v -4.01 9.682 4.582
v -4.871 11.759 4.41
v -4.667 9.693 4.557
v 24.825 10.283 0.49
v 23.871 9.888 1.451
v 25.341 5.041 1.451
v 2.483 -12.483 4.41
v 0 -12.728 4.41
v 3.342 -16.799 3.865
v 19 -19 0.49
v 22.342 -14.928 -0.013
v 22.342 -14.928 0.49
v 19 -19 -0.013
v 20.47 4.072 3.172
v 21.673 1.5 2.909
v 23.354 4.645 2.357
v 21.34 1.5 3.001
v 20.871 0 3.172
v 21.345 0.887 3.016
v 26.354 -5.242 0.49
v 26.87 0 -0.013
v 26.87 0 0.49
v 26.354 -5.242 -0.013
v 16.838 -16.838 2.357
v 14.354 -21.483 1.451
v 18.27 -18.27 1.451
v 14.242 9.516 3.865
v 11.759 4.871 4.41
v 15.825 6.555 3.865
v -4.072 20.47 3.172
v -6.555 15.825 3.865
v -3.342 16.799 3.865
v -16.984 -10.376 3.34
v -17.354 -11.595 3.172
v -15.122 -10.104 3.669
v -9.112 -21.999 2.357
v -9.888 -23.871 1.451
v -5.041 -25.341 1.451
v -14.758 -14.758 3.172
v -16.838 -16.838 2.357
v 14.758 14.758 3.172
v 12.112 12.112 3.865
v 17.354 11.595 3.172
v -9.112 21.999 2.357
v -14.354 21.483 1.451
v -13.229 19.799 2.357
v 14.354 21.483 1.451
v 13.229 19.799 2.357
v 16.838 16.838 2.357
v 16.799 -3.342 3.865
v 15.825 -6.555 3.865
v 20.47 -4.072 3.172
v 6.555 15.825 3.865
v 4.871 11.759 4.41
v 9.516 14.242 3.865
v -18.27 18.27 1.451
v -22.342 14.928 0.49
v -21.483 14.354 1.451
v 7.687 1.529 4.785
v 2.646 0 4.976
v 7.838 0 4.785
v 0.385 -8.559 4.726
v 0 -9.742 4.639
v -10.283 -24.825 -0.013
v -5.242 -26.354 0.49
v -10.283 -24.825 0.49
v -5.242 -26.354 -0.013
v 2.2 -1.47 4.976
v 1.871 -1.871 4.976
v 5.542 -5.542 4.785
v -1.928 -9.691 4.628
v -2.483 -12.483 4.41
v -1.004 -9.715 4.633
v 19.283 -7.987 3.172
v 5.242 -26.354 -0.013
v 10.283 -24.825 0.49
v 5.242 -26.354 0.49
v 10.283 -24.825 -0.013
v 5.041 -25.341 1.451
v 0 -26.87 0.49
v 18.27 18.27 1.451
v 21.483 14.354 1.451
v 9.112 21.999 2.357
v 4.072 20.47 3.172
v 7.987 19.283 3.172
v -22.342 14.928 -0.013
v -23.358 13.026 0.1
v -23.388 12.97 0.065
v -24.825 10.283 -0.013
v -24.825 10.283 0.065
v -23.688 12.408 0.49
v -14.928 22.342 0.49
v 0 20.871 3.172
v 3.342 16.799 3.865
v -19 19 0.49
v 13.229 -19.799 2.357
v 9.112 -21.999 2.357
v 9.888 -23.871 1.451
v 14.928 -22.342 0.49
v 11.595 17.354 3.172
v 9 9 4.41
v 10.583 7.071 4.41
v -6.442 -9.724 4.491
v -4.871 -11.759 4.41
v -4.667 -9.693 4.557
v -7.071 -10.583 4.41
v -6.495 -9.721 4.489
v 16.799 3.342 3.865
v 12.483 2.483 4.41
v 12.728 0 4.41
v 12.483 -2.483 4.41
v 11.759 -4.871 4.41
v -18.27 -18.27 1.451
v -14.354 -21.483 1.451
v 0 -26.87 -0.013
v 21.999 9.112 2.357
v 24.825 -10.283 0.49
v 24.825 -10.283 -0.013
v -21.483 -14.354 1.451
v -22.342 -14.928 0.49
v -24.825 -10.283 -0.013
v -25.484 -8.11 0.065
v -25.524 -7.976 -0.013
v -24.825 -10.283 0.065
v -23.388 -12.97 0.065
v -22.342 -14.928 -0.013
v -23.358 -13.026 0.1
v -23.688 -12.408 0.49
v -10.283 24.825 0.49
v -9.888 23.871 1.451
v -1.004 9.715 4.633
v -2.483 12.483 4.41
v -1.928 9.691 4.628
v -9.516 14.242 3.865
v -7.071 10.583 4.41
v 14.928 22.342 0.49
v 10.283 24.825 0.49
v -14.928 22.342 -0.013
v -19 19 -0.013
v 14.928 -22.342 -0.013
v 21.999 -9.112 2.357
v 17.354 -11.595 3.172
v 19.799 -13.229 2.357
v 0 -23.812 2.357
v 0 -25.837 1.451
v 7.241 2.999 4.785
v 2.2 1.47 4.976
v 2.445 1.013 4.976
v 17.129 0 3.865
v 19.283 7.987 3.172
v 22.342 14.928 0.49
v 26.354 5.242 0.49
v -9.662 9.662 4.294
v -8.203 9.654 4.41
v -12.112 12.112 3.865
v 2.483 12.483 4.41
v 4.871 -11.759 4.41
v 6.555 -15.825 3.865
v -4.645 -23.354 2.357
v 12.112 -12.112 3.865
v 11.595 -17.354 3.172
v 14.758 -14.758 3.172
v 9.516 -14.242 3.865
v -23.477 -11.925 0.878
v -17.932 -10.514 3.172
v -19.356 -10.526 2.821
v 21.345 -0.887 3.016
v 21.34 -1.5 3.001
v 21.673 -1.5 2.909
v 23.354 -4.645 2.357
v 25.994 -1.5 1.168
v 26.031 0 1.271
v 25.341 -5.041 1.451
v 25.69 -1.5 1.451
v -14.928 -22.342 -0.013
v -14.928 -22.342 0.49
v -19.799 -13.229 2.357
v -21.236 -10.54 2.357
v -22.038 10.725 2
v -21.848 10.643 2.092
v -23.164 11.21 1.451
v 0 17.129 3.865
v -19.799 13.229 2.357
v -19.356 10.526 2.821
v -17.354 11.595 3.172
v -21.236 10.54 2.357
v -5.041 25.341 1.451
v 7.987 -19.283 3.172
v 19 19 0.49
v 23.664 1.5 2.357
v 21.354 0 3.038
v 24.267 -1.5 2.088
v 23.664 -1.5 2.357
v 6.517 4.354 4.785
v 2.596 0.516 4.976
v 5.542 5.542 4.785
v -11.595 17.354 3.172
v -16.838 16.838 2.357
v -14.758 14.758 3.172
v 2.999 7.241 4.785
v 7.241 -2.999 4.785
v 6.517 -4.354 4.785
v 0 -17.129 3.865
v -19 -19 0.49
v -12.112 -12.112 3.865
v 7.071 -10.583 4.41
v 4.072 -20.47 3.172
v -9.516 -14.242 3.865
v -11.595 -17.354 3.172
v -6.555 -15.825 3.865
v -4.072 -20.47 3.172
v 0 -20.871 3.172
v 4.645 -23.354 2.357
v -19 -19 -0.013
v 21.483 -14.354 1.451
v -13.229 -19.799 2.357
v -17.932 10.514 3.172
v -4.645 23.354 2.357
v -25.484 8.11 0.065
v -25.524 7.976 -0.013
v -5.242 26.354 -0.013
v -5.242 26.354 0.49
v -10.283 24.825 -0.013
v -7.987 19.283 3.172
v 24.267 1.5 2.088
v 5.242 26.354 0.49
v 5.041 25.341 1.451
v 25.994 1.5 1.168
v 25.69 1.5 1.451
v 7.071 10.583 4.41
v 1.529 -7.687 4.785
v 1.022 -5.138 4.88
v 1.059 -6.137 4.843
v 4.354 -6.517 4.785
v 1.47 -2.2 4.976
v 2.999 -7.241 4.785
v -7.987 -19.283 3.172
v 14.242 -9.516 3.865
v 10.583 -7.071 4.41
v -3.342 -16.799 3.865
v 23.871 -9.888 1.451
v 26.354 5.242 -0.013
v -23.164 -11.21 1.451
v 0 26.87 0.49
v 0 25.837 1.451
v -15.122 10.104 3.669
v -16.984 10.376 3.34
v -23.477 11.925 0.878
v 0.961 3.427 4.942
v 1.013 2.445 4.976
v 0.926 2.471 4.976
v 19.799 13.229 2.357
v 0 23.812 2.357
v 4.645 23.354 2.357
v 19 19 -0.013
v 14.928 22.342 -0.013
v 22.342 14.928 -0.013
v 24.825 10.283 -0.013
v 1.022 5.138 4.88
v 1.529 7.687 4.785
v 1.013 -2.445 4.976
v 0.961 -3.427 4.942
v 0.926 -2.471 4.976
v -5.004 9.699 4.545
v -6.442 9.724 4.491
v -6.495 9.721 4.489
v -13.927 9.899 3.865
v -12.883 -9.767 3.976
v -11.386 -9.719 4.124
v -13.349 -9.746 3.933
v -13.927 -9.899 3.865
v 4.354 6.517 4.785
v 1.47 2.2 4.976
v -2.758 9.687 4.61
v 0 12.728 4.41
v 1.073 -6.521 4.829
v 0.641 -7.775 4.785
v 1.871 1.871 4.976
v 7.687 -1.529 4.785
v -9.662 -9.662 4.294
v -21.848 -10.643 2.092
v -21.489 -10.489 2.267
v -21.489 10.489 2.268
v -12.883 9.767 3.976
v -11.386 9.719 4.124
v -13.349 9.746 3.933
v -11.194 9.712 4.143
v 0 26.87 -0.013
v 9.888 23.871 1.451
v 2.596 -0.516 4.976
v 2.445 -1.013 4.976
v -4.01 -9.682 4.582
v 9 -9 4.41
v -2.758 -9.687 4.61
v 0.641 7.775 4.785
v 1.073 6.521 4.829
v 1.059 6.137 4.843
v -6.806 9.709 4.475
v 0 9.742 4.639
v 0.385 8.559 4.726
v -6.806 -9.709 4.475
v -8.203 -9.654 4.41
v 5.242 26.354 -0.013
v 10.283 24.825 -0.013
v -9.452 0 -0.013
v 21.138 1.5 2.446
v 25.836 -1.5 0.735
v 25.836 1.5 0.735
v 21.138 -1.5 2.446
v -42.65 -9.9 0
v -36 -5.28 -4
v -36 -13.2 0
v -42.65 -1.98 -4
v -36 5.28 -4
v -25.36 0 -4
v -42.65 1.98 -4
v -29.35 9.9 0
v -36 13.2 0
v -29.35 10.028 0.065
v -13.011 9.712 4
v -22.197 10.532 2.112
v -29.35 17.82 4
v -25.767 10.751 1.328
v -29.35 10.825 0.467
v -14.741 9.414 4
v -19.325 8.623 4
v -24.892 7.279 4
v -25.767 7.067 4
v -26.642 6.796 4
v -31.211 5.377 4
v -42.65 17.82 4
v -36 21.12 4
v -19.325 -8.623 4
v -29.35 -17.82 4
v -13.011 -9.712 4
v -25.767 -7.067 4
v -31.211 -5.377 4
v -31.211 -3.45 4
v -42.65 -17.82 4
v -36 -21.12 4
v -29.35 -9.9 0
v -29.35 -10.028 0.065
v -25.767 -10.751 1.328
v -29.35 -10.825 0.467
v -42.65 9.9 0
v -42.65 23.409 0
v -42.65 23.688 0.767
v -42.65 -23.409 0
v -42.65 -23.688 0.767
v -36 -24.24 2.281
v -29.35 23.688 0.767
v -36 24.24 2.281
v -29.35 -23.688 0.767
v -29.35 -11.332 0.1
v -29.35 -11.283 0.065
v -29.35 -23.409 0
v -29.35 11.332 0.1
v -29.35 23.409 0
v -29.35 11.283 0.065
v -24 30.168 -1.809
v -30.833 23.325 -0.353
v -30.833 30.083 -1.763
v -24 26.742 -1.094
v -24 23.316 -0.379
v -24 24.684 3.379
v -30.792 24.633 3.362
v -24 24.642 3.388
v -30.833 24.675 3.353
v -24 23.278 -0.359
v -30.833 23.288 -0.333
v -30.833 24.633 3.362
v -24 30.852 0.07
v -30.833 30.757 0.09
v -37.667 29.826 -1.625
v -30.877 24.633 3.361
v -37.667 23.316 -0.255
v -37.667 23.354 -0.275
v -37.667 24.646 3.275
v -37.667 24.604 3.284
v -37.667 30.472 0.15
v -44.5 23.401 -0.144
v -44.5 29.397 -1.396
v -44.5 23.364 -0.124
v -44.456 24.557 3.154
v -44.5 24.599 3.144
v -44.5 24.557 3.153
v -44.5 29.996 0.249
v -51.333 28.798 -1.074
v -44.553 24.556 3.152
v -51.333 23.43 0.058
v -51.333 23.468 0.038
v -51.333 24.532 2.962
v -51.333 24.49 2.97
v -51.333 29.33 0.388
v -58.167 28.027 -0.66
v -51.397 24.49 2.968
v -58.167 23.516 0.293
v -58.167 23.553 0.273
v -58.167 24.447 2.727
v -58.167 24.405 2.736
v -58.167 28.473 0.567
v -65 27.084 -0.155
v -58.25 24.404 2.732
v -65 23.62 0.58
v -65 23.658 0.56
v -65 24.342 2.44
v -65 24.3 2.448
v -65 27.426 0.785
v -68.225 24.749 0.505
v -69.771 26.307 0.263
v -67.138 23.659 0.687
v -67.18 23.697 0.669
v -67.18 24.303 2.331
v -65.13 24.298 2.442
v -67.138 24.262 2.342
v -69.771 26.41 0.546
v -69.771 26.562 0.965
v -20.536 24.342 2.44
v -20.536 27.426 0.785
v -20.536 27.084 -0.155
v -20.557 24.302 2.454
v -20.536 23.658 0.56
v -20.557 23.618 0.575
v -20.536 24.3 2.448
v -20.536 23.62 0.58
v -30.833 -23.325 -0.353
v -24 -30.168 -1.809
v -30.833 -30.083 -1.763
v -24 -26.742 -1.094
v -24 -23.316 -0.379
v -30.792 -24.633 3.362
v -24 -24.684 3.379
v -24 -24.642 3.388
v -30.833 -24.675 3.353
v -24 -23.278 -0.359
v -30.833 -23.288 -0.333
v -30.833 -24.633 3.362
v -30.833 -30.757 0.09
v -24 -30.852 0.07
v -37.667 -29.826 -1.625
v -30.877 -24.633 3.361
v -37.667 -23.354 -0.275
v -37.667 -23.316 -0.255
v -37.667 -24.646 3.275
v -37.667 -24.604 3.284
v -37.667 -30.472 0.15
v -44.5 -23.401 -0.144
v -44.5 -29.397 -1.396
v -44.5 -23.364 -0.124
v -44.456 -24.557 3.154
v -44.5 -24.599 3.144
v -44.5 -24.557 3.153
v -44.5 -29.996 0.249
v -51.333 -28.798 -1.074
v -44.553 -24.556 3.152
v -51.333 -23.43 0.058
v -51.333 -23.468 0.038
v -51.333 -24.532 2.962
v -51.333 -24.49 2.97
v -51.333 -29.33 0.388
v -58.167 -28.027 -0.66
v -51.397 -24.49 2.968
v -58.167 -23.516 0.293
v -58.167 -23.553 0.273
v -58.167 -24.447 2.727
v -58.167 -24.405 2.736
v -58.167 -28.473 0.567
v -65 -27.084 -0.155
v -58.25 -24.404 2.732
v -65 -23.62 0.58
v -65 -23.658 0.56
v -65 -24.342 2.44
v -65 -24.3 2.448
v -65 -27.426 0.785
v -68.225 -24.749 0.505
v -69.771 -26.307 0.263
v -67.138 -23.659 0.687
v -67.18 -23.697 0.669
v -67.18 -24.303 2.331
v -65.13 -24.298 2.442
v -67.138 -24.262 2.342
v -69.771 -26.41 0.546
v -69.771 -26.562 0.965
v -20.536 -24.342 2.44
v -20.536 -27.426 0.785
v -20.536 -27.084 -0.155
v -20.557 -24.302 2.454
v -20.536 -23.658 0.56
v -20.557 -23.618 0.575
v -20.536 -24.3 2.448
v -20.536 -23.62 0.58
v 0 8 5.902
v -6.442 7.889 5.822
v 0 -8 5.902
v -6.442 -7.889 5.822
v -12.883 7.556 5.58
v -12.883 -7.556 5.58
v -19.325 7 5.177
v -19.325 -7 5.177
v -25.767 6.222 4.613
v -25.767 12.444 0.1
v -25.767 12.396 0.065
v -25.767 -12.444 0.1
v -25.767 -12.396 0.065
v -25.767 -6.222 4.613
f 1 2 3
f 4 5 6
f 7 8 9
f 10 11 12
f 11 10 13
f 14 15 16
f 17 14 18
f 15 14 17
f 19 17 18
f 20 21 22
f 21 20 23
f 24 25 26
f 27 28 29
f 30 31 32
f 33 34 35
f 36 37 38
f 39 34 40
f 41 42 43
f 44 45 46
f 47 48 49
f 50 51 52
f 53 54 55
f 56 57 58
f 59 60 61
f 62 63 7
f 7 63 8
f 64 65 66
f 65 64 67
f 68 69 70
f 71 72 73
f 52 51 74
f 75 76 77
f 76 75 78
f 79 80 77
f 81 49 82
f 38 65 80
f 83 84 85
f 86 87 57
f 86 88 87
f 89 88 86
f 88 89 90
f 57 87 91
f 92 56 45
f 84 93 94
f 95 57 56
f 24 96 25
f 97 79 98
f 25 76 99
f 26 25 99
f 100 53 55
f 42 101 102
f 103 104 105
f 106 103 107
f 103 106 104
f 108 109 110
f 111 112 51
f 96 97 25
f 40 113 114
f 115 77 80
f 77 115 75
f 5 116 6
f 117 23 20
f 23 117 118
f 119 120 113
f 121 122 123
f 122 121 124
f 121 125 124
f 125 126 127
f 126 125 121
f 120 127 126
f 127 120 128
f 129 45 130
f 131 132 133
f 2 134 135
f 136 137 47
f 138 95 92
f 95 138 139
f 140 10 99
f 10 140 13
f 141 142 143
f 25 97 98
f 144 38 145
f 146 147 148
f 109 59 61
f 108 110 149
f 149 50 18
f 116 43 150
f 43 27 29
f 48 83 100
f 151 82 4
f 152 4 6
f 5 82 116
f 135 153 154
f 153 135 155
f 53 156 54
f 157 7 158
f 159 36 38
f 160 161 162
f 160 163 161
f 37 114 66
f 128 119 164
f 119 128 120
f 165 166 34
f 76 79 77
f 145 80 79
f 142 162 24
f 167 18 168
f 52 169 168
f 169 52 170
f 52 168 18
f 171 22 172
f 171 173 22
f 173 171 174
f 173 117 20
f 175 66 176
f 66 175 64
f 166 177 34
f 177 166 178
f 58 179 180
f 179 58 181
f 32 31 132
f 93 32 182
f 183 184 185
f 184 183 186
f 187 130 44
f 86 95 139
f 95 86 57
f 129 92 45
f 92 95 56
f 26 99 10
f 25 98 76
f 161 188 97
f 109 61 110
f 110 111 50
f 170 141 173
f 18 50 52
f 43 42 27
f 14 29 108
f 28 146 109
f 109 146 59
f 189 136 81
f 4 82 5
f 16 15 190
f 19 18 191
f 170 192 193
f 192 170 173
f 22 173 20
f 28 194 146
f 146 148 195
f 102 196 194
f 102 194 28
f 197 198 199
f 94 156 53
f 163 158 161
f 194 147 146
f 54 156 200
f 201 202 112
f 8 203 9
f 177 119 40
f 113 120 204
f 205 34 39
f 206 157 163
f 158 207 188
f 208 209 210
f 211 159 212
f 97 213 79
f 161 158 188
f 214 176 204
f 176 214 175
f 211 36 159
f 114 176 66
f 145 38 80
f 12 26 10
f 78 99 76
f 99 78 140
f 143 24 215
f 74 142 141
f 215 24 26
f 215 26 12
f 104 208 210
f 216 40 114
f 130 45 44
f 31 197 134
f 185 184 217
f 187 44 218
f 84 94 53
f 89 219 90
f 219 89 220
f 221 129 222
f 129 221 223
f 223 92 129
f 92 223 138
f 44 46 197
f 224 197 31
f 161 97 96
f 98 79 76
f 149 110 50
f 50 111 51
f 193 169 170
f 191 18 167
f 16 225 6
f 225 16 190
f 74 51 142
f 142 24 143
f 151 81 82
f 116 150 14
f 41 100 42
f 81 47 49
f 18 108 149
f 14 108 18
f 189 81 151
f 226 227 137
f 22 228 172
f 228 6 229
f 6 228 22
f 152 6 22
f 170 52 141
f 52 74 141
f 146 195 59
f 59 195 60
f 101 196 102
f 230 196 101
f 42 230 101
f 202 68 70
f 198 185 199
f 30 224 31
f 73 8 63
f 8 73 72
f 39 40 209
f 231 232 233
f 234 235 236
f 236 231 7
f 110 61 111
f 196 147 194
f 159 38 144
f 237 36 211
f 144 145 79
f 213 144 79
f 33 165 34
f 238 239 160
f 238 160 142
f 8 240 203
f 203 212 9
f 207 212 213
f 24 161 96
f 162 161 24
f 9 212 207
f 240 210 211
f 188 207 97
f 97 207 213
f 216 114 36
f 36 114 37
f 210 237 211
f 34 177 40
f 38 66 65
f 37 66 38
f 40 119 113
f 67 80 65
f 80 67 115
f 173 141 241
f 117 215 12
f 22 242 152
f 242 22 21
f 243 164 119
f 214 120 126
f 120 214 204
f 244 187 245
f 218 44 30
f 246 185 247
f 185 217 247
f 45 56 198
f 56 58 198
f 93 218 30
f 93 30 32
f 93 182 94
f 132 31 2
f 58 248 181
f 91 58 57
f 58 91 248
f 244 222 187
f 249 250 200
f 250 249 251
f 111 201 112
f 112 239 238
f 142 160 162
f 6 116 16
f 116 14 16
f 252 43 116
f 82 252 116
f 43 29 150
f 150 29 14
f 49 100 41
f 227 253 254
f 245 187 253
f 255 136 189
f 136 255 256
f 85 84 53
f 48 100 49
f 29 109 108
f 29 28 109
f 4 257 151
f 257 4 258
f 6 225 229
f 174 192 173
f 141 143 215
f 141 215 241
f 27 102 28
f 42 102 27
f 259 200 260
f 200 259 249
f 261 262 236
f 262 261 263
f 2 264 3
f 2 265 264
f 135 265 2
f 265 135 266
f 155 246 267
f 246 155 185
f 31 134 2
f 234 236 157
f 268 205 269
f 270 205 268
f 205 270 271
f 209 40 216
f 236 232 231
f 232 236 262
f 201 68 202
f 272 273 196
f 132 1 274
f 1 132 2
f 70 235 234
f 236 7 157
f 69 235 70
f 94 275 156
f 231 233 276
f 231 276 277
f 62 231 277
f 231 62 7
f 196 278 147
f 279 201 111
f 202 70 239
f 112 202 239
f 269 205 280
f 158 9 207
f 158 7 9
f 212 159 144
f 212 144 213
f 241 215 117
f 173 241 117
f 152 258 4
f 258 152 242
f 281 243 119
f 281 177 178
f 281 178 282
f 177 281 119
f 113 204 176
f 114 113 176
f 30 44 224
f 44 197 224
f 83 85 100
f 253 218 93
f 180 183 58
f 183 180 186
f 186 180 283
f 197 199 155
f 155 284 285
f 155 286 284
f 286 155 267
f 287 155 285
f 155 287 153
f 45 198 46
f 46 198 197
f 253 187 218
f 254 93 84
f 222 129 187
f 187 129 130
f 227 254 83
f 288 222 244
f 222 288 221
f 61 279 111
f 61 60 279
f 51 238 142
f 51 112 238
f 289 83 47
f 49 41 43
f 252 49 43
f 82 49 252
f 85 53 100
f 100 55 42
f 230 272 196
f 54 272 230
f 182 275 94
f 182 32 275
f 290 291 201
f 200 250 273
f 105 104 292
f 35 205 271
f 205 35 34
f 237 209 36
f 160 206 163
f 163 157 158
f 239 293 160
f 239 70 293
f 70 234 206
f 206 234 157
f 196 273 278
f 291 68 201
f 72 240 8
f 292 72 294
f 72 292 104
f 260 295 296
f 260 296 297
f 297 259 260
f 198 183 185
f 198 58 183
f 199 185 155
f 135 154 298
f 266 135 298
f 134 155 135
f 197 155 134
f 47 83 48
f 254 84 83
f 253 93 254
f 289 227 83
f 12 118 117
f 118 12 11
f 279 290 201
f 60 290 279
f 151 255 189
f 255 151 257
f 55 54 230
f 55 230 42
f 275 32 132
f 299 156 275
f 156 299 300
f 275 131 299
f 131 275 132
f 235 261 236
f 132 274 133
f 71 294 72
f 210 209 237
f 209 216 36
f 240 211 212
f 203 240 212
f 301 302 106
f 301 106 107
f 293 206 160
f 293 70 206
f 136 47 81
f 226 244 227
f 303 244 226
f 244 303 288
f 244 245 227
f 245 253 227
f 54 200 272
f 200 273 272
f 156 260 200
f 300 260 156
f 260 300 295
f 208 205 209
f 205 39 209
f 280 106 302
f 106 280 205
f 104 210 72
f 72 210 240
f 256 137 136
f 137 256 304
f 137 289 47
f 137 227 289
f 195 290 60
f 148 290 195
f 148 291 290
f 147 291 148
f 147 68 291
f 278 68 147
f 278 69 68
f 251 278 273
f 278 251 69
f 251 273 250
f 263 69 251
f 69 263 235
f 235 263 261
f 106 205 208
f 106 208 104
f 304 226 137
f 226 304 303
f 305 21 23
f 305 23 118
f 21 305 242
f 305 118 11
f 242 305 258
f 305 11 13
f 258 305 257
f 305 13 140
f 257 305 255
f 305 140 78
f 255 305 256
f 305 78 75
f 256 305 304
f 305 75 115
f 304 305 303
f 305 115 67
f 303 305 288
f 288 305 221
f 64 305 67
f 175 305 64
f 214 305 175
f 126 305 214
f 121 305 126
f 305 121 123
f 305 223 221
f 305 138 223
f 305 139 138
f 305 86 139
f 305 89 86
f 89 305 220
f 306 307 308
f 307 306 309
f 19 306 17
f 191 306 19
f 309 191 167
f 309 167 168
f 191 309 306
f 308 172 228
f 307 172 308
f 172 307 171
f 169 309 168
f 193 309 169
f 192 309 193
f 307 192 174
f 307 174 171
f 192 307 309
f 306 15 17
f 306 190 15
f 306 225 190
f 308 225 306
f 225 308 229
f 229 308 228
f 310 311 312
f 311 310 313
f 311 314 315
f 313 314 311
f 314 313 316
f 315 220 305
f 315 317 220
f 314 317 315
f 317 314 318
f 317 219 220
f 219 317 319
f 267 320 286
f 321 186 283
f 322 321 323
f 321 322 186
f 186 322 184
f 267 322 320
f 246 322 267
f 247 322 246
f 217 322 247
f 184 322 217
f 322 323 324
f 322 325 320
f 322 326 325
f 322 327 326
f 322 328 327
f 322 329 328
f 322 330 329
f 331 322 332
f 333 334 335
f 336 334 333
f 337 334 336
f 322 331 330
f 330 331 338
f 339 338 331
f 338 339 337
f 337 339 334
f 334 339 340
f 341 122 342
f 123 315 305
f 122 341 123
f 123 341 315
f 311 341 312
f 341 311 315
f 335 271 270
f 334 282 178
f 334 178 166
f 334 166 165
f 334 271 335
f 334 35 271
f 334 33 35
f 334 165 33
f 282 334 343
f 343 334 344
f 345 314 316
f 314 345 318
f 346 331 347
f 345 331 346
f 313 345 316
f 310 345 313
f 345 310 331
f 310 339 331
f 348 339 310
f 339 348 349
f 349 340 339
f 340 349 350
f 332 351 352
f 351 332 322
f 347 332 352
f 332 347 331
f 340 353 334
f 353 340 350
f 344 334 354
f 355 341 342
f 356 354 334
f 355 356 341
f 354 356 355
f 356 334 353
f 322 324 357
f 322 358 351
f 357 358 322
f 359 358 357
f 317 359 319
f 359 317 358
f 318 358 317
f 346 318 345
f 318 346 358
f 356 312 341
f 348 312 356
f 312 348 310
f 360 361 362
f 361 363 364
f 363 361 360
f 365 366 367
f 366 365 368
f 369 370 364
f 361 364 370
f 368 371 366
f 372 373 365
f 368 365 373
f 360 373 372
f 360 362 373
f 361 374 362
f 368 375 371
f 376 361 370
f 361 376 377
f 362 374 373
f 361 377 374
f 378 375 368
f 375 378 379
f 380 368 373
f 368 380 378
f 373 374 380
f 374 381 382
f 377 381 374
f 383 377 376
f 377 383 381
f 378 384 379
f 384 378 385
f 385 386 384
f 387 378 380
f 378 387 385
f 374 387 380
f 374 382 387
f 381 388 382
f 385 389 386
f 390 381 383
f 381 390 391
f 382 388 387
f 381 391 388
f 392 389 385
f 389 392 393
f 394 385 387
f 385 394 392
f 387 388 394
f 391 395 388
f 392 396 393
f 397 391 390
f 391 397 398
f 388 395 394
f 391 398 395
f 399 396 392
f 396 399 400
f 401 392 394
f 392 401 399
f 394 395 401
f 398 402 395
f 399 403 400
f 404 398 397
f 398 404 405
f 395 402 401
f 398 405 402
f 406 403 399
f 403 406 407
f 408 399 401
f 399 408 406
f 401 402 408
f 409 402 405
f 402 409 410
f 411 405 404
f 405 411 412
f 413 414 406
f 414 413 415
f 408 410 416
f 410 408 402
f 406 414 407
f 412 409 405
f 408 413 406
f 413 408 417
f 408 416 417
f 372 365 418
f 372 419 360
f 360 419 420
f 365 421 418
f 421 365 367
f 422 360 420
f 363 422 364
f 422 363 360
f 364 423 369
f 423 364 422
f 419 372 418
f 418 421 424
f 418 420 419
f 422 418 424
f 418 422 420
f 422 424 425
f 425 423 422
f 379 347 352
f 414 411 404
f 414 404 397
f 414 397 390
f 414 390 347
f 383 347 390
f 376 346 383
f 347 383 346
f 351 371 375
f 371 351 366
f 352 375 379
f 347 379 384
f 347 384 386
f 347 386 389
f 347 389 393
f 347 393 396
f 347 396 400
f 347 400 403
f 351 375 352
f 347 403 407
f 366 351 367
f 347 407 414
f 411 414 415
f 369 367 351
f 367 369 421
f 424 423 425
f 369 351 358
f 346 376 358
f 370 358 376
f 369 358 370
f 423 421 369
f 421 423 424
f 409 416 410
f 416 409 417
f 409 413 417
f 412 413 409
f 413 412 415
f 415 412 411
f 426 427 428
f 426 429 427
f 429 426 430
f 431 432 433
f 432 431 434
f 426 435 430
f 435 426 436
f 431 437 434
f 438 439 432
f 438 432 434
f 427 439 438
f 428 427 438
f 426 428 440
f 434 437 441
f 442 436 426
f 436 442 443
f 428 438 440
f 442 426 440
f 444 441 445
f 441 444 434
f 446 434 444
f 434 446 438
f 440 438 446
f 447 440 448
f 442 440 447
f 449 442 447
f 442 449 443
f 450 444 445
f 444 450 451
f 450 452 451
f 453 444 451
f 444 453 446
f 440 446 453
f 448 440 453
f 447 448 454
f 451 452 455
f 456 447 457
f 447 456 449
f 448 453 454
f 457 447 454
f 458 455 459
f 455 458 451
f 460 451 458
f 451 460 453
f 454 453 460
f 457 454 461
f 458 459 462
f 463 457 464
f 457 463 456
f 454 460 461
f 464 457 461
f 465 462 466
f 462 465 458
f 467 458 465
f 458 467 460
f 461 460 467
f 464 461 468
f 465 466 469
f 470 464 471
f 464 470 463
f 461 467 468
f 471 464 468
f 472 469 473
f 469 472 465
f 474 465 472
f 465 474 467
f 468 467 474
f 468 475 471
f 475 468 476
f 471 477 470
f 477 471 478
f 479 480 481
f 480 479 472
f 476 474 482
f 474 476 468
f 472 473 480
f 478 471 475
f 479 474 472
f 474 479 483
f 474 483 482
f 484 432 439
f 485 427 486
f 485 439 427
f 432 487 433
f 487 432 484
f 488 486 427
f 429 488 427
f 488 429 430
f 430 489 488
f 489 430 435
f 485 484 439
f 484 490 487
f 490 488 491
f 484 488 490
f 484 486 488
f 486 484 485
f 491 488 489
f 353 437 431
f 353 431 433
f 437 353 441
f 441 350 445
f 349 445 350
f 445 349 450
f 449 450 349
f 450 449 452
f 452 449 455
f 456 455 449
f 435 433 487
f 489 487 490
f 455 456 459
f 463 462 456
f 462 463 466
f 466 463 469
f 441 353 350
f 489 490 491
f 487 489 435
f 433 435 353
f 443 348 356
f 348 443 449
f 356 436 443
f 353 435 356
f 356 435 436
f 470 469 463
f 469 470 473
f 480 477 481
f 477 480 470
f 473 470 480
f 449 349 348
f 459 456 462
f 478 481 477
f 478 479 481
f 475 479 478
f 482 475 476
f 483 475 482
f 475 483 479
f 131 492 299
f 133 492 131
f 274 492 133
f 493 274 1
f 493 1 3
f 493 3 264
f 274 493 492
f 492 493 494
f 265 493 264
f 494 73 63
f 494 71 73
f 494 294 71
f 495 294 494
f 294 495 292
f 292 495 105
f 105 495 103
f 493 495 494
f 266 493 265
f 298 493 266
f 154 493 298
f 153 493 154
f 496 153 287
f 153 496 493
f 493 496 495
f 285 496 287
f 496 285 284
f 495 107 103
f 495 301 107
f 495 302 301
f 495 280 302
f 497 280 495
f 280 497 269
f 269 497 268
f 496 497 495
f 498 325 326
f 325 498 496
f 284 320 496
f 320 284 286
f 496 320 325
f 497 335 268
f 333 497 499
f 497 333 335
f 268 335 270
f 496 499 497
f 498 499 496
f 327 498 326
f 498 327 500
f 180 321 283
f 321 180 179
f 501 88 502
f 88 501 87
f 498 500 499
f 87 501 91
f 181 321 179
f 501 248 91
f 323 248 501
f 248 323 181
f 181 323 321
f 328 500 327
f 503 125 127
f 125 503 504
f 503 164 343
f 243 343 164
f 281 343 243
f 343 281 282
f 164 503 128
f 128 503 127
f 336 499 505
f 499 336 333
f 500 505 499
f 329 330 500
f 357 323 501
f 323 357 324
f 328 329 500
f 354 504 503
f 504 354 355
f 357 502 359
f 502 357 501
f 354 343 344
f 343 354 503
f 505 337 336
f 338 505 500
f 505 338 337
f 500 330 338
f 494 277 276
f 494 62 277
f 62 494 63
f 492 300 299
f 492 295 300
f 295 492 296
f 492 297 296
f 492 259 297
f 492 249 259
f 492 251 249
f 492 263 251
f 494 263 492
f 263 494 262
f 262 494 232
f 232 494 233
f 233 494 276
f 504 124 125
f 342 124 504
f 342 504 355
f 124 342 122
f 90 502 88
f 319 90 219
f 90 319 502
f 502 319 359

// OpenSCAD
// file: util.scad
fn1 = 32;
fn2 = 16;

module util_half_sphere(radius, fn=fn1) {
    difference() {
        sphere(radius, $fn=fn);
        translate([0,0,-(radius+radius/19)])
            cube(2*radius+radius/10, center=true);
    }
}

function gcd(a,b) = a == b ? a : a > b ? gcd(a-b, b) : gcd(a, b-a);

module util_saucer(length, width, height, fn=fn1) {
    rad = gcd(length,gcd(width,height));
    //rad = 10;
    scale([length/(2*rad), width/(2*rad), height/rad])
        util_half_sphere(rad, fn);
}

module util_half_cylinder(length, radius, inner_fn=fn2, outer_fn=fn1) {
    maxval = max(length, 2*radius);
    intersection() {
        difference() {
            rotate([0,90,0])
                translate([0,0,-(length/2 + length/20)])
                    cylinder(length+length/10, radius, radius, $fn=inner_fn);
            
            translate([0,0,(maxval/2 + maxval/19)])
                cube(maxval+maxval/10, center=true);
        }
        
        translate([0,0,-(radius+radius/20)])
            cylinder(radius + radius/10, length/2, length/2, $fn=outer_fn);
    }
}

module util_body(length, width, height, upper_height, fn=fn1) {
    rad = gcd(length, gcd(width, upper_height));
    
    scale(.995) scale([length/(2*rad), width/(2*rad), 1])
        util_half_cylinder(2*rad, height, outer_fn=fn);
}

module util_graded_cylinder(height, radius_start, radius_end, grades=1, fn=fn1) {
    height_grade = height / grades;
    radius_grade = (radius_start - radius_end) / (grades * grades);
    for (i = [0 : 1 : grades]) {
        translate([0,0,i*height_grade])
            cylinder(height_grade, 
                     radius_start - i*radius_grade * i,
                     radius_start - (i+1) * radius_grade * (i+1),
                     $fn = fn);
    }
}

module util_nacelle(length, width, height, curved=false, up=true, front_bulge=false) {
    rad = min(width, height/2);
    grads = curved ? 6 : 1;
    scale_factor = front_bulge ? 1.1 : 1;
    direction = up ? -1 : 1;
    difference() {
        scale([1, width/ (2*rad), height/rad])
            difference() {
                union() {
                    rotate([0,-90,0])
                        rotate(30)
                            util_graded_cylinder(length-rad, rad, rad/2, grads, 6);
                    scale(scale_factor) 
                        rotate([0,90,0]) rotate(90) sphere(rad, $fn=6);
                }
                
                translate([-length/2, 0, direction * (height/2 + height/19)])
                    cube([length+length, width+width, height+height/10], center=true);
            }
        
        translate([-length-(curved?length/3:0), 0, -length/3])
            rotate([0,-45,0])
                cube(length, center=true);
    }
}

module util_mirrored(v) {
    children();
    mirror(v) children();
}

module util_ring(outer, inner, height) {
    difference() {
        translate([0,0,-height/2])
            cylinder(height, outer, outer);
        translate([0,0,-(height/2 + height/19)])
            cylinder(height+height/10, inner, inner);
    }
}

module util_star(radius, thick, num, half=false) {
    angle = 360/num;
    offset = half? angle/2 : 0;
    for (i = [0: 1: num]) {
        rotate(i* angle + offset)
            translate([radius/2,0,0])
                cube([radius, thick, thick], center=true);
    }
}

module util_ring_star(radius, thick, num, inner, half=false) {
    outer=inner+thick;
    avg = (inner + outer)/2;
    union() {
        difference() {
            util_star(radius, thick, num, half);
            cylinder(2*thick, outer, outer, $fn=num, center=true);
        }
        util_ring(outer, inner, thick);
    }
}

module util_hangar_disk(height, lower, upper, num, fn=fn1) {
    difference() {
            cylinder(height, lower, upper, $fn=fn, center=true);
        difference() {
            scale([1,1,22])
                util_star(1.1*upper, height/20, num, half=true);
            scale(.95)
                cylinder(height, lower, upper, $fn=fn, center=true);
        }
    }
}

module util_hangar_form(length, width, height, num, inner=0) {
    l = 0.6* max(length, width);
    h = 2.5* height;
    thick = min(height/20,1);
    inner = inner == 0 ? l/3 : inner;
    difference() {
        children();
        scale([1,1,h/thick]) 
            util_ring_star(l, thick, num, inner, half=true);
    }
    scale(.95) children();
}

module util_nacelle_bar(span, height, width, thickness) {
    rad = (span*span/(8*height) + height/2);
    outer = rad + thickness/2;
    inner = rad - thickness/2;
    difference(){
        translate([0,0,outer])
            rotate([0,90,0])
                util_ring(outer, inner, width);
    
        translate([0,0,1.1*outer+height])
            cube(2.2*outer, center=true);
    }
}
// main file
use <util.scad>;

module tactical_shuttle() {
    difference() {
        util_saucer(9,9,2.25);

        translate([3,0,2])
            rotate([0,-66,0])
                cube([1.5,1.5,3],center=true);
    }

    translate([-3.5,0,1])
        scale([1,1,.5])
            rotate([90,0,0])
                cylinder(5,2,2,$fn=6,center=true);

    util_mirrored([0,1,0])
        translate([-4,1.5,1])
            rotate([90,0,0])
                util_nacelle(7.5,1,4,curved=true,up=false);
};


module runabout() {
    difference() {
        util_saucer(18,18,3);

        translate([6,0,3])
            rotate([0,-75,0])
                cube([3,3,5],center=true);
    }

    translate([-7.5,0,0])
        scale([1,1,.4])
            rotate([90,0,0])
                cylinder(10,4,4,$fn=6,center=true);

    translate([-7.5,0,1])
        mirror([0,0,1])
            util_nacelle_bar(16,2.5,3,.5);

    util_mirrored([0,1,0])
        translate([-3,7.5,-2])
            scale([1,1,.5])
                union() {
                    rotate([0,90,0])
                        cylinder(14,1.5,1.5,center=true,$fn=16);

                    util_mirrored([1,0,0])
                        translate([7,0,0])
                            sphere(1.5,$fn=16);
                }
}

module yacht() {
    difference() {
        util_saucer(27,27,3.5);

        translate([10,0,3])
            rotate([0,-75,0])
                cube([3,3,5],center=true);
    }

    translate([-13,0,0]) {

        difference(){
            mirror([0,0,1])
                util_saucer(16,8,2.5);

            translate([-4,0,-2.5])
                scale([1.5,1,1])
                    rotate([90,0,0])
                        cylinder(10,2.5,2.5,center=true,$fn=16);
            
            translate([-9,0,-5])
                cube(10,center=true);
            
            translate([7.5,0,-1.25])
                rotate([0,90,0])
                    cylinder(4,.5,1,$fn=16, center=true);
        }

        util_saucer(16,8,1.5);
    }

    translate([-11,0,0])
        difference() {
            util_nacelle_bar(25,2.5,27,.25);
            
            translate([-29.5,0,0])
                cylinder(40,20,20,center=true);

            util_mirrored([0,1,0])
                translate([11,25,0])
                    cylinder(40,25,25,center=true);
        }

    util_mirrored([0,1,0])
        translate([-14,11,2.5])
            util_nacelle(20,4,2,curved=true);
}


module science_runabout() {
    difference() {
        util_saucer(36,36,4);

        translate([15,0,3])
            rotate([0,-75,0])
                cube([3,3,5],center=true);
    }

    translate([-13,0,0]) difference() {
        scale([1.5,1,1.2])
            rotate([90,0,0])
                cylinder(15,4,4,$fn=6,center=true);
        
        translate([0,0,-10]) cube(20,center=true);
    }
    
    translate([-15,0,1])
        util_nacelle_bar(28,2.5,3,.5);
    
    util_mirrored([0,1,0])
        translate([-8,12,3])
            util_nacelle(24,4,2,curved=true);
}


module attack() {
    difference() {
        util_saucer(45,45,5);

        translate([20,0,3])
            rotate([0,-70,0])
                cube([3,3,5],center=true);
        
    }

    difference() {
        scale([1,1,2.5])
            util_body(45,45,1.5,6);
    
        translate([22.5,0,-1.2])
            sphere(1,$fn=16);
    }

    util_mirrored([0,1,0])
        translate([-12,12,-2.5])
            rotate([75,0,0])
                util_nacelle(40,5,12,curved=true,up=false);

    difference() {
        translate([-10,0,0])
            mirror([0,0,1])
                util_nacelle_bar(35,3.2,20,2);

        util_mirrored([0,1,0])
            translate([2,18,0])
                cylinder(15,15,15,center=true);
        
        translate([-38,0,0]) cylinder(15,22.5,22,5,center=true);
    }
}

module scout() {
    difference() {
        util_saucer(54,54,5);

        translate([24,0,3])
            rotate([0,-70,0])
                cube([3,3,5],center=true);
    }

    translate([-36,0,0]) 
    scale([1.33,.66,1]) {
        difference() {
            cylinder(8,8,32,center=true,$fn=4);
            translate([-35,0,0])
                cube(60,center=true);
        }

        difference() {
            cylinder(8,54,32,center=true,$fn=4);
            translate([-35,0,0])
                cube([60,200,60],center=true);
            translate([35,0,0])
                cube([60,200,60],center=true);
            translate([0,0,-60])
                cube(120,center=true);
        }
    }

    util_mirrored([0,1,0])
        translate([-24,24,1.5])
            rotate([-110,0,0])
                util_nacelle(45,4,8,curved=true);

    translate([0,0,.1])
    util_nacelle(42,32,6.7,curved=true);
}

scout();
